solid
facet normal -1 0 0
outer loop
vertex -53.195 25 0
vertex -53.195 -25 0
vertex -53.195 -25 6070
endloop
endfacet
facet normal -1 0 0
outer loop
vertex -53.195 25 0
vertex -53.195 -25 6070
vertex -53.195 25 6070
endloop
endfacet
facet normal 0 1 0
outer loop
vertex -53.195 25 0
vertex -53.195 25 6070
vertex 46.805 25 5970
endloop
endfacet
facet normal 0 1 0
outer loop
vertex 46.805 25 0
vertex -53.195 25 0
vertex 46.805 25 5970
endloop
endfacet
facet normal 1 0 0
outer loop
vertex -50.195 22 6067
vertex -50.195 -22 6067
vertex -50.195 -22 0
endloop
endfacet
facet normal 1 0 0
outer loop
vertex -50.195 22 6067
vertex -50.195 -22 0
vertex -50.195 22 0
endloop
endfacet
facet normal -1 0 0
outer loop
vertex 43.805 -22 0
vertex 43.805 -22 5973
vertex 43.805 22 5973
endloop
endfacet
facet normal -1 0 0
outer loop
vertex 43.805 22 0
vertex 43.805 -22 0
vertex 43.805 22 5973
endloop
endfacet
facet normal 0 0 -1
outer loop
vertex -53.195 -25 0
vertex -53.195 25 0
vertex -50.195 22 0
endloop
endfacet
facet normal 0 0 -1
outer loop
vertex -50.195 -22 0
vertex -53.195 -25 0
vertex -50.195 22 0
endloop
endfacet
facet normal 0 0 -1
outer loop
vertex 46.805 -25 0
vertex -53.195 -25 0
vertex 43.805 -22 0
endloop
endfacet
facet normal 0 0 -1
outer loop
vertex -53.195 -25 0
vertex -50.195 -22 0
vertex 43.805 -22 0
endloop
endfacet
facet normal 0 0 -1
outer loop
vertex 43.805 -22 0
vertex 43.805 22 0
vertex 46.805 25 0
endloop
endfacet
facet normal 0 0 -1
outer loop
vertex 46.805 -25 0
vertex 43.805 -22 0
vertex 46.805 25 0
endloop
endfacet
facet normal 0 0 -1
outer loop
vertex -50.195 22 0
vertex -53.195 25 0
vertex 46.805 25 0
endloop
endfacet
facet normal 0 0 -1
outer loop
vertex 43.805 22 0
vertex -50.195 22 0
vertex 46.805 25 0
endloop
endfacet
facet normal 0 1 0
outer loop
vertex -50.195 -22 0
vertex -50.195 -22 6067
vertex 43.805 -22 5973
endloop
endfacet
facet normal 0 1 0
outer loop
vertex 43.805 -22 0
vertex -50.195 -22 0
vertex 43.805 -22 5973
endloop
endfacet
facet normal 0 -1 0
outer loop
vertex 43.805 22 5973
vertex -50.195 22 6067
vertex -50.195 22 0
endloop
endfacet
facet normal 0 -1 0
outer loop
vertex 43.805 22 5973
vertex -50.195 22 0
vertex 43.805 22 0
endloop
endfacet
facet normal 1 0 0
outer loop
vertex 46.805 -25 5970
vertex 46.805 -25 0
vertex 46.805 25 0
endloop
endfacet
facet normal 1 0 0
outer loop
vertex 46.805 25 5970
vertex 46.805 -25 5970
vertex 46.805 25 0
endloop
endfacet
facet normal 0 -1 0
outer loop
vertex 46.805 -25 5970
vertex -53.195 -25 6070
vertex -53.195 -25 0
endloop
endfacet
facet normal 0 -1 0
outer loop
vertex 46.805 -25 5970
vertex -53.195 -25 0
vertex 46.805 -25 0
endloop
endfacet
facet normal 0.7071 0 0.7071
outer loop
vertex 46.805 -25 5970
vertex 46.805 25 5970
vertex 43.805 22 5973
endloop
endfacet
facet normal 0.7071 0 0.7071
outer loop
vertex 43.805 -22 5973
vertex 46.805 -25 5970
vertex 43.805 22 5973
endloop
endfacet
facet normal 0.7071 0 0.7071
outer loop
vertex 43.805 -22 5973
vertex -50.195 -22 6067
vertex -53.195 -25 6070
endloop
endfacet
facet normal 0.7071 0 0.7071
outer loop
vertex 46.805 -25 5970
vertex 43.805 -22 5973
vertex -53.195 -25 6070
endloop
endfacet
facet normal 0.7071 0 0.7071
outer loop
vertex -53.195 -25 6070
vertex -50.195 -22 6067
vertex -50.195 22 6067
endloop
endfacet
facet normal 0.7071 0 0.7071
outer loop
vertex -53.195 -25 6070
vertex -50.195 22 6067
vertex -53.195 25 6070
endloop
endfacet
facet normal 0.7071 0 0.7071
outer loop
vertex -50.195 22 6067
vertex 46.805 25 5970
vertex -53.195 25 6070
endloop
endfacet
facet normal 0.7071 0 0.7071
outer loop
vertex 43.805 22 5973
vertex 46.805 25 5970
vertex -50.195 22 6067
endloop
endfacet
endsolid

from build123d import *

# Parameters (mm, degrees)
F0_W        = 100
F0_H        = 50
F0_W_2      = 94
F0_H_2      = 44
F1_DEPTH    = 6070
F2_T1_DEPTH = 564.3365975932


# Not quite as in the source:
# - a fillet or chamfer that OpenCascade refuses, or shapes differently, is made with other operations: its cross-section is extruded or revolved along the edge and cut away or added


with BuildPart() as f1:
    # F0 (on Top) → F1 (new body)
    with BuildSketch(Plane.XY):
        with Locations((-3.195107216, 0)):
            Rectangle(F0_W, F0_H)
        with Locations((-3.195107216, 0)):
            Rectangle(F0_W_2, F0_H_2, mode=Mode.SUBTRACT)
    extrude(amount=F1_DEPTH)

    # F2: chamfer of 100 on 1 edges, made by hand

    # F2_s2 → F2_t1 (cut)
    with BuildSketch(Plane.XZ.offset(-282.1682987966)):
        Polygon((46.804892784, 5970), (-53.195107216, 6070), (46.804892784, 6070), align=None)
    extrude(amount=F2_T1_DEPTH, mode=Mode.SUBTRACT)


solid = f1.part
